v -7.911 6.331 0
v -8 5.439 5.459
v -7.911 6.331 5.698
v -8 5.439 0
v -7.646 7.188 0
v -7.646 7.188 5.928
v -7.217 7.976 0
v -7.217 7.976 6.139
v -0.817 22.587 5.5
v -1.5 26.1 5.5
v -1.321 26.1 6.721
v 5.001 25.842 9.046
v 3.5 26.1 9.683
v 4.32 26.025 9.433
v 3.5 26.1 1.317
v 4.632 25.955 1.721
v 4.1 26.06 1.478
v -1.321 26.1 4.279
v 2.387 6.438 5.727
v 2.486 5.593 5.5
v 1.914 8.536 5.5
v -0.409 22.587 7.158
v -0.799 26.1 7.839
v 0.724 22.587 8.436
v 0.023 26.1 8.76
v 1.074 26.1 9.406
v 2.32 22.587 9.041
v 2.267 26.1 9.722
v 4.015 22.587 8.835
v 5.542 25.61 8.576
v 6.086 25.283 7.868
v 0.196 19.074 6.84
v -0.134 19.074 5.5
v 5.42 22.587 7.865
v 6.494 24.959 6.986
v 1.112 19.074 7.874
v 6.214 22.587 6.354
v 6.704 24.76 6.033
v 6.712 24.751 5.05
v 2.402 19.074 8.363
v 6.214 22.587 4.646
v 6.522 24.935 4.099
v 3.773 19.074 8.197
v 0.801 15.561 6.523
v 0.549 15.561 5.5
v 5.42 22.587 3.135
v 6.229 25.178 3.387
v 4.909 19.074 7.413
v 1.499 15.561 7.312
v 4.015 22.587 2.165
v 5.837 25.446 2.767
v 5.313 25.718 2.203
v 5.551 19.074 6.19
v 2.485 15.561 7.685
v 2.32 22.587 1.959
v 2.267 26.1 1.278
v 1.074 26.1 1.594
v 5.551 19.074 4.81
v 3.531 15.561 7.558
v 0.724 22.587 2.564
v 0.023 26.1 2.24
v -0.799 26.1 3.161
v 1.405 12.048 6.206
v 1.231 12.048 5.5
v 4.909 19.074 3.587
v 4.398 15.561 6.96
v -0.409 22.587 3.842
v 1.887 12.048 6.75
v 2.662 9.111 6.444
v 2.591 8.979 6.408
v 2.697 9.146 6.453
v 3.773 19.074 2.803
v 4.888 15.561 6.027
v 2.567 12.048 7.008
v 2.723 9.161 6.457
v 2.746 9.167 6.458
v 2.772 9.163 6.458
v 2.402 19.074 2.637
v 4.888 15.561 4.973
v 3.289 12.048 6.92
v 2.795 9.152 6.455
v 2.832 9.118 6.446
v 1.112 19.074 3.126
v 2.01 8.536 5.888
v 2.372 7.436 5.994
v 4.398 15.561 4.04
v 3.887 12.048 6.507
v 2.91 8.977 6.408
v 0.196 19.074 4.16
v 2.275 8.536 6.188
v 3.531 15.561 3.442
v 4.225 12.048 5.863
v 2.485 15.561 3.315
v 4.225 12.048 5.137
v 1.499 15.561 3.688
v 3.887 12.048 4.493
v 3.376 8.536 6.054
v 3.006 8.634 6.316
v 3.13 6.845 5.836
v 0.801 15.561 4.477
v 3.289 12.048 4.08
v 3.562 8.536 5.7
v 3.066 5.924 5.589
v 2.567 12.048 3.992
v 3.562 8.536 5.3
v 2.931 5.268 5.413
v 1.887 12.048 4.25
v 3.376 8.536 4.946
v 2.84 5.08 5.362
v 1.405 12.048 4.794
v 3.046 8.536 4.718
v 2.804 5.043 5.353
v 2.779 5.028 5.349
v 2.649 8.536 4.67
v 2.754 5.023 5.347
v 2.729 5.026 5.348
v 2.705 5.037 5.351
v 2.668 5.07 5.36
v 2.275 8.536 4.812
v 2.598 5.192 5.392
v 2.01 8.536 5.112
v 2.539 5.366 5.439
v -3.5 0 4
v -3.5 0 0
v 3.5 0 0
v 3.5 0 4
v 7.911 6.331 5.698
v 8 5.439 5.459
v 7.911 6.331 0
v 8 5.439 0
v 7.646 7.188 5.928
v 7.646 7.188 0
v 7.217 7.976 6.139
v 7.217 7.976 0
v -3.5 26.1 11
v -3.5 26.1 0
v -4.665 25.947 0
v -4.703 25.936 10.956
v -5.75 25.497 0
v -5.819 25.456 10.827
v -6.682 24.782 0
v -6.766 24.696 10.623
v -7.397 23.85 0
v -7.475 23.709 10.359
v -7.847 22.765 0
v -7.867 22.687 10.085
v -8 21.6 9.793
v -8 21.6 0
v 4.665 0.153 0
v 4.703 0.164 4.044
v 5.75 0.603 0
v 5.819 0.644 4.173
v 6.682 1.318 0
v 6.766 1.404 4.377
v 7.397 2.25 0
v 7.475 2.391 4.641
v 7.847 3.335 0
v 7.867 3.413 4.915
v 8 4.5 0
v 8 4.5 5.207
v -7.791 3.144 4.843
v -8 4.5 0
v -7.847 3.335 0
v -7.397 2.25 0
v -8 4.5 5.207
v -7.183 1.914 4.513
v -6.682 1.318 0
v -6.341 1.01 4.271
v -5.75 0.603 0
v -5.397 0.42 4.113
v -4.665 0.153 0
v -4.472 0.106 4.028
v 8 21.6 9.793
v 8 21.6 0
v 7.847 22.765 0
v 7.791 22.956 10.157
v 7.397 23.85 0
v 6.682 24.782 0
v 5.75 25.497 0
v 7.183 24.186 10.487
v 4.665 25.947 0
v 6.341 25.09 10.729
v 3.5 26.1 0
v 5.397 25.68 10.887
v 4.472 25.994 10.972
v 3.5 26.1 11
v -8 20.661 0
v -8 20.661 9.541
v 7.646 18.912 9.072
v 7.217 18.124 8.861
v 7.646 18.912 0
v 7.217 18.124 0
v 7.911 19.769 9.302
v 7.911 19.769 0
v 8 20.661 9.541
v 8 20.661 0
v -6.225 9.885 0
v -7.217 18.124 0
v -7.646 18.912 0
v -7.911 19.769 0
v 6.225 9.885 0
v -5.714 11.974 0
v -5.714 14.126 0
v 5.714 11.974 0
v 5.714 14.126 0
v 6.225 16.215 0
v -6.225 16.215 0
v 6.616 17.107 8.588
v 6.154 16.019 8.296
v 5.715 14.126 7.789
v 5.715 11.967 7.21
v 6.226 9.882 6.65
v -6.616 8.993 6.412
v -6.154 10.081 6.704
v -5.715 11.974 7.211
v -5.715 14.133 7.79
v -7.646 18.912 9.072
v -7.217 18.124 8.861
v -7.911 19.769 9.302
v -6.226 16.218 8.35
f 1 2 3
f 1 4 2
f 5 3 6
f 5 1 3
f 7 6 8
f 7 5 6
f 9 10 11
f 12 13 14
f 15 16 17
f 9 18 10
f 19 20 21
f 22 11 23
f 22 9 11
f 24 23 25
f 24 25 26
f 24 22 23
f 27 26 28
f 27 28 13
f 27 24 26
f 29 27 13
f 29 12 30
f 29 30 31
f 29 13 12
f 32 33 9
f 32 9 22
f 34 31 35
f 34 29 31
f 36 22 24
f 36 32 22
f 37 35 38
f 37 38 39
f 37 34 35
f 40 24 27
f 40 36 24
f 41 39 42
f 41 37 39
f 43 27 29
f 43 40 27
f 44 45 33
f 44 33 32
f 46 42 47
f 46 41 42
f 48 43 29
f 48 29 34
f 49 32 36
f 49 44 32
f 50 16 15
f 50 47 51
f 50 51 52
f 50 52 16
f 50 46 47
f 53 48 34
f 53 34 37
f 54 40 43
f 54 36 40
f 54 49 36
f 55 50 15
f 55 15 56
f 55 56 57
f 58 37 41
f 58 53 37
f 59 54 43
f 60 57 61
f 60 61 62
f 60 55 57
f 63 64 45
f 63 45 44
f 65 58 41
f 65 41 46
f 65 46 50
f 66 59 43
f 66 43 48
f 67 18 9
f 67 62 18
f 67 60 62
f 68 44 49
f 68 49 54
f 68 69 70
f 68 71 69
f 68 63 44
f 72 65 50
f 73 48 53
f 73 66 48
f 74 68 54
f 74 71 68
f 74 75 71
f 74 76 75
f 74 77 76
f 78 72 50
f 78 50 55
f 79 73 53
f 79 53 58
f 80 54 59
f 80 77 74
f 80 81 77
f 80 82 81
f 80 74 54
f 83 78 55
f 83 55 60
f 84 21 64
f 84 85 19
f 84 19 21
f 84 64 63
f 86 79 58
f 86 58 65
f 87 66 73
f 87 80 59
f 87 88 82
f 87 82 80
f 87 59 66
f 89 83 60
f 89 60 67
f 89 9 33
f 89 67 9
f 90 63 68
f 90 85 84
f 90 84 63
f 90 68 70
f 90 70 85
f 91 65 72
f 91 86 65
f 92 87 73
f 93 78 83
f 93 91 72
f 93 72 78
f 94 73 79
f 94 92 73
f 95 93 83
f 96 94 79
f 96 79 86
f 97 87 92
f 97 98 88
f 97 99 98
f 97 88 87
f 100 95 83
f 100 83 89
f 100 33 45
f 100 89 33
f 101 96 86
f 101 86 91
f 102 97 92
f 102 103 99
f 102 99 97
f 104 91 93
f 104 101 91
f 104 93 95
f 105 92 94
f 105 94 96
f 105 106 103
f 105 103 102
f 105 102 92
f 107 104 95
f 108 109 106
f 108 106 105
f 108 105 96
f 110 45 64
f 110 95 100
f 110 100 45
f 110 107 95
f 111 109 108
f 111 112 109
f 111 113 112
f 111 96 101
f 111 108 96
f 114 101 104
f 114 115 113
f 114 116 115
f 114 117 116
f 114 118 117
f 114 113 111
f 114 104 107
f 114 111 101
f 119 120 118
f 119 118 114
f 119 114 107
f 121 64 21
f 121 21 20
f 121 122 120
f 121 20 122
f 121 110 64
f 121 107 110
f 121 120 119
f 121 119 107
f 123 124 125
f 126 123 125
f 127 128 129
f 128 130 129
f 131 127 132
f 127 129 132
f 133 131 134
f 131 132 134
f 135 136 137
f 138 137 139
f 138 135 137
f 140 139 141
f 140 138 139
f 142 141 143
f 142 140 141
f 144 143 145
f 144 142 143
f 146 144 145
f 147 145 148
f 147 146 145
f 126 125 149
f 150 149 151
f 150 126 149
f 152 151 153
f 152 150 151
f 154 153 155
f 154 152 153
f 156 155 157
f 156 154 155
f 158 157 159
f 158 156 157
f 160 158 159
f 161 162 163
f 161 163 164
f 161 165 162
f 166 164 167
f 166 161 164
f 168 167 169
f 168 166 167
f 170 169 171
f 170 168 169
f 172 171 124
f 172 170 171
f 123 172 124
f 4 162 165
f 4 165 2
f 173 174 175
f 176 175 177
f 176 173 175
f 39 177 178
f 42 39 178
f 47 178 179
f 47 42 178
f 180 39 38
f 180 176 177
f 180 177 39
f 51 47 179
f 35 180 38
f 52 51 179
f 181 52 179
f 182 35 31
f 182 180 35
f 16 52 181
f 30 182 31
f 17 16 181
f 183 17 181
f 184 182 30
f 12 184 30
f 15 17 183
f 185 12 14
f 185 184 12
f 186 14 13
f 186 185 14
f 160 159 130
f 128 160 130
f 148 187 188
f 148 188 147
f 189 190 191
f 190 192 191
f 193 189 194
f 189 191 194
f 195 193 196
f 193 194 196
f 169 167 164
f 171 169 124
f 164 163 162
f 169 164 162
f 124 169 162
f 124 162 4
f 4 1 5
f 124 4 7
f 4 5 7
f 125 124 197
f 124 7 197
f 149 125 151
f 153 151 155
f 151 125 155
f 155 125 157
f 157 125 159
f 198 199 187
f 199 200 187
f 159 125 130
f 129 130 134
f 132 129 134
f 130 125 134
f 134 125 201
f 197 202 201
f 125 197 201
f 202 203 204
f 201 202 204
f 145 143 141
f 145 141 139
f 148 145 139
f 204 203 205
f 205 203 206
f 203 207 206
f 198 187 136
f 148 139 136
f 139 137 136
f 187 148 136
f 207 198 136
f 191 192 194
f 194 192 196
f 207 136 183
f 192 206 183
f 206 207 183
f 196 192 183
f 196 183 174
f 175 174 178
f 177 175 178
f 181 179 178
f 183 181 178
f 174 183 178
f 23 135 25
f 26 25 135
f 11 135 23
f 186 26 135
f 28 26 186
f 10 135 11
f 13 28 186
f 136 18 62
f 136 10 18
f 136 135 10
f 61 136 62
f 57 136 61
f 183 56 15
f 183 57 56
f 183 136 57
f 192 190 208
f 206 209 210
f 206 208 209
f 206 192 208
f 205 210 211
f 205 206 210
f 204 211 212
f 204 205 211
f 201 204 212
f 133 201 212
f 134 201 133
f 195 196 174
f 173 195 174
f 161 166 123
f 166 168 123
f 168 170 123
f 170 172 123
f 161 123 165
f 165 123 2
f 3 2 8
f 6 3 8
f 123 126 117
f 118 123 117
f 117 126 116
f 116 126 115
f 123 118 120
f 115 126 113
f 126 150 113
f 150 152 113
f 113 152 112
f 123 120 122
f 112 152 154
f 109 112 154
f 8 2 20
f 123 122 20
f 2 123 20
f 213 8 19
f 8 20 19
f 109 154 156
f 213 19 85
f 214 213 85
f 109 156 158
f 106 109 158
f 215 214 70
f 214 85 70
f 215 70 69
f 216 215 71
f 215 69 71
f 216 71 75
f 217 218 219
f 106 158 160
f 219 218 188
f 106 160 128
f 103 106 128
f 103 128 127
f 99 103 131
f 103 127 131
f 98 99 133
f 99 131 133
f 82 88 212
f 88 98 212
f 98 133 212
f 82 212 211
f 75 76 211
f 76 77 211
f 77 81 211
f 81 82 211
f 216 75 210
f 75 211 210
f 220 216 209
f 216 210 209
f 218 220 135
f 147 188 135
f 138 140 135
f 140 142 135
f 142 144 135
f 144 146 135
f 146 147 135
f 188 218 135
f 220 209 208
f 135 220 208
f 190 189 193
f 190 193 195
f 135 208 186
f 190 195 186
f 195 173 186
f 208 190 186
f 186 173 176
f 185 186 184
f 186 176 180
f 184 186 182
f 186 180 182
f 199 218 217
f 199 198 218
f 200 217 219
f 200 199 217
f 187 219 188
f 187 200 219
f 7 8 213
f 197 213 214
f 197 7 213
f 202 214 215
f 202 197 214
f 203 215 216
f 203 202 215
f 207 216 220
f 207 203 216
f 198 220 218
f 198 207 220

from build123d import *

# Parameters (mm, degrees)
F0_W     = 16
F0_H     = 26.1
F1_DEPTH = 11
F2_R     = 9
F3_DEPTH = 25
F5_DEPTH = 12.5
F6_R     = 4.5
F7_R     = 4.25


# Not quite as in the source:
# - an extrude whose draft closes it to a point is written as a loft to that point


with BuildPart() as f1:
    # F0 (on Top) → F1 (new body)
    with BuildSketch(Plane.XY):
        with Locations((0, 13.05)):
            Rectangle(F0_W, F0_H)
    extrude(amount=F1_DEPTH)

    # F2 (on Top) → F3 (cut)
    with BuildSketch(Plane.XY):
        with Locations((-14.65, 13.05)):
            Circle(F2_R)
        with Locations((14.65, 13.05)):
            Circle(F2_R)
    extrude(amount=F3_DEPTH, mode=Mode.SUBTRACT)

    # F4 (on Right) → F5 (cut, symmetric)
    with BuildSketch(Plane.YZ):
        Polygon((0, 4), (26.1, 11), (0, 11), align=None)
    extrude(amount=F5_DEPTH, both=True, mode=Mode.SUBTRACT)

    # F6
    f6_edges = [f1.edges().sort_by_distance(p)[0] for p in [
        (-8, 26.1, 5.5),
        (-8, 6.985554, 2.93676),
        (-8, 19.114446, 4.56324),
        (-8, 0, 2),
        (8, 0, 2),
        (8, 6.985554, 2.93676),
        (8, 19.114446, 4.56324),
        (8, 26.1, 5.5),
    ]]
    fillet(f6_edges, radius=F6_R)

    # F7 (on face) → F8 section 0
    with BuildSketch(Plane(origin=(0, 26.1, 0), x_dir=(-1, 0, 0), z_dir=(0, 1, 0)), mode=Mode.PRIVATE) as f8_s0:
        with Locations((-2.75, 5.5)):
            Circle(F7_R)
    loft([f8_s0.sketch, Vertex(2.75, 4.2356454321, 5.5)], ruled=True, mode=Mode.SUBTRACT)


solid = f1.part
